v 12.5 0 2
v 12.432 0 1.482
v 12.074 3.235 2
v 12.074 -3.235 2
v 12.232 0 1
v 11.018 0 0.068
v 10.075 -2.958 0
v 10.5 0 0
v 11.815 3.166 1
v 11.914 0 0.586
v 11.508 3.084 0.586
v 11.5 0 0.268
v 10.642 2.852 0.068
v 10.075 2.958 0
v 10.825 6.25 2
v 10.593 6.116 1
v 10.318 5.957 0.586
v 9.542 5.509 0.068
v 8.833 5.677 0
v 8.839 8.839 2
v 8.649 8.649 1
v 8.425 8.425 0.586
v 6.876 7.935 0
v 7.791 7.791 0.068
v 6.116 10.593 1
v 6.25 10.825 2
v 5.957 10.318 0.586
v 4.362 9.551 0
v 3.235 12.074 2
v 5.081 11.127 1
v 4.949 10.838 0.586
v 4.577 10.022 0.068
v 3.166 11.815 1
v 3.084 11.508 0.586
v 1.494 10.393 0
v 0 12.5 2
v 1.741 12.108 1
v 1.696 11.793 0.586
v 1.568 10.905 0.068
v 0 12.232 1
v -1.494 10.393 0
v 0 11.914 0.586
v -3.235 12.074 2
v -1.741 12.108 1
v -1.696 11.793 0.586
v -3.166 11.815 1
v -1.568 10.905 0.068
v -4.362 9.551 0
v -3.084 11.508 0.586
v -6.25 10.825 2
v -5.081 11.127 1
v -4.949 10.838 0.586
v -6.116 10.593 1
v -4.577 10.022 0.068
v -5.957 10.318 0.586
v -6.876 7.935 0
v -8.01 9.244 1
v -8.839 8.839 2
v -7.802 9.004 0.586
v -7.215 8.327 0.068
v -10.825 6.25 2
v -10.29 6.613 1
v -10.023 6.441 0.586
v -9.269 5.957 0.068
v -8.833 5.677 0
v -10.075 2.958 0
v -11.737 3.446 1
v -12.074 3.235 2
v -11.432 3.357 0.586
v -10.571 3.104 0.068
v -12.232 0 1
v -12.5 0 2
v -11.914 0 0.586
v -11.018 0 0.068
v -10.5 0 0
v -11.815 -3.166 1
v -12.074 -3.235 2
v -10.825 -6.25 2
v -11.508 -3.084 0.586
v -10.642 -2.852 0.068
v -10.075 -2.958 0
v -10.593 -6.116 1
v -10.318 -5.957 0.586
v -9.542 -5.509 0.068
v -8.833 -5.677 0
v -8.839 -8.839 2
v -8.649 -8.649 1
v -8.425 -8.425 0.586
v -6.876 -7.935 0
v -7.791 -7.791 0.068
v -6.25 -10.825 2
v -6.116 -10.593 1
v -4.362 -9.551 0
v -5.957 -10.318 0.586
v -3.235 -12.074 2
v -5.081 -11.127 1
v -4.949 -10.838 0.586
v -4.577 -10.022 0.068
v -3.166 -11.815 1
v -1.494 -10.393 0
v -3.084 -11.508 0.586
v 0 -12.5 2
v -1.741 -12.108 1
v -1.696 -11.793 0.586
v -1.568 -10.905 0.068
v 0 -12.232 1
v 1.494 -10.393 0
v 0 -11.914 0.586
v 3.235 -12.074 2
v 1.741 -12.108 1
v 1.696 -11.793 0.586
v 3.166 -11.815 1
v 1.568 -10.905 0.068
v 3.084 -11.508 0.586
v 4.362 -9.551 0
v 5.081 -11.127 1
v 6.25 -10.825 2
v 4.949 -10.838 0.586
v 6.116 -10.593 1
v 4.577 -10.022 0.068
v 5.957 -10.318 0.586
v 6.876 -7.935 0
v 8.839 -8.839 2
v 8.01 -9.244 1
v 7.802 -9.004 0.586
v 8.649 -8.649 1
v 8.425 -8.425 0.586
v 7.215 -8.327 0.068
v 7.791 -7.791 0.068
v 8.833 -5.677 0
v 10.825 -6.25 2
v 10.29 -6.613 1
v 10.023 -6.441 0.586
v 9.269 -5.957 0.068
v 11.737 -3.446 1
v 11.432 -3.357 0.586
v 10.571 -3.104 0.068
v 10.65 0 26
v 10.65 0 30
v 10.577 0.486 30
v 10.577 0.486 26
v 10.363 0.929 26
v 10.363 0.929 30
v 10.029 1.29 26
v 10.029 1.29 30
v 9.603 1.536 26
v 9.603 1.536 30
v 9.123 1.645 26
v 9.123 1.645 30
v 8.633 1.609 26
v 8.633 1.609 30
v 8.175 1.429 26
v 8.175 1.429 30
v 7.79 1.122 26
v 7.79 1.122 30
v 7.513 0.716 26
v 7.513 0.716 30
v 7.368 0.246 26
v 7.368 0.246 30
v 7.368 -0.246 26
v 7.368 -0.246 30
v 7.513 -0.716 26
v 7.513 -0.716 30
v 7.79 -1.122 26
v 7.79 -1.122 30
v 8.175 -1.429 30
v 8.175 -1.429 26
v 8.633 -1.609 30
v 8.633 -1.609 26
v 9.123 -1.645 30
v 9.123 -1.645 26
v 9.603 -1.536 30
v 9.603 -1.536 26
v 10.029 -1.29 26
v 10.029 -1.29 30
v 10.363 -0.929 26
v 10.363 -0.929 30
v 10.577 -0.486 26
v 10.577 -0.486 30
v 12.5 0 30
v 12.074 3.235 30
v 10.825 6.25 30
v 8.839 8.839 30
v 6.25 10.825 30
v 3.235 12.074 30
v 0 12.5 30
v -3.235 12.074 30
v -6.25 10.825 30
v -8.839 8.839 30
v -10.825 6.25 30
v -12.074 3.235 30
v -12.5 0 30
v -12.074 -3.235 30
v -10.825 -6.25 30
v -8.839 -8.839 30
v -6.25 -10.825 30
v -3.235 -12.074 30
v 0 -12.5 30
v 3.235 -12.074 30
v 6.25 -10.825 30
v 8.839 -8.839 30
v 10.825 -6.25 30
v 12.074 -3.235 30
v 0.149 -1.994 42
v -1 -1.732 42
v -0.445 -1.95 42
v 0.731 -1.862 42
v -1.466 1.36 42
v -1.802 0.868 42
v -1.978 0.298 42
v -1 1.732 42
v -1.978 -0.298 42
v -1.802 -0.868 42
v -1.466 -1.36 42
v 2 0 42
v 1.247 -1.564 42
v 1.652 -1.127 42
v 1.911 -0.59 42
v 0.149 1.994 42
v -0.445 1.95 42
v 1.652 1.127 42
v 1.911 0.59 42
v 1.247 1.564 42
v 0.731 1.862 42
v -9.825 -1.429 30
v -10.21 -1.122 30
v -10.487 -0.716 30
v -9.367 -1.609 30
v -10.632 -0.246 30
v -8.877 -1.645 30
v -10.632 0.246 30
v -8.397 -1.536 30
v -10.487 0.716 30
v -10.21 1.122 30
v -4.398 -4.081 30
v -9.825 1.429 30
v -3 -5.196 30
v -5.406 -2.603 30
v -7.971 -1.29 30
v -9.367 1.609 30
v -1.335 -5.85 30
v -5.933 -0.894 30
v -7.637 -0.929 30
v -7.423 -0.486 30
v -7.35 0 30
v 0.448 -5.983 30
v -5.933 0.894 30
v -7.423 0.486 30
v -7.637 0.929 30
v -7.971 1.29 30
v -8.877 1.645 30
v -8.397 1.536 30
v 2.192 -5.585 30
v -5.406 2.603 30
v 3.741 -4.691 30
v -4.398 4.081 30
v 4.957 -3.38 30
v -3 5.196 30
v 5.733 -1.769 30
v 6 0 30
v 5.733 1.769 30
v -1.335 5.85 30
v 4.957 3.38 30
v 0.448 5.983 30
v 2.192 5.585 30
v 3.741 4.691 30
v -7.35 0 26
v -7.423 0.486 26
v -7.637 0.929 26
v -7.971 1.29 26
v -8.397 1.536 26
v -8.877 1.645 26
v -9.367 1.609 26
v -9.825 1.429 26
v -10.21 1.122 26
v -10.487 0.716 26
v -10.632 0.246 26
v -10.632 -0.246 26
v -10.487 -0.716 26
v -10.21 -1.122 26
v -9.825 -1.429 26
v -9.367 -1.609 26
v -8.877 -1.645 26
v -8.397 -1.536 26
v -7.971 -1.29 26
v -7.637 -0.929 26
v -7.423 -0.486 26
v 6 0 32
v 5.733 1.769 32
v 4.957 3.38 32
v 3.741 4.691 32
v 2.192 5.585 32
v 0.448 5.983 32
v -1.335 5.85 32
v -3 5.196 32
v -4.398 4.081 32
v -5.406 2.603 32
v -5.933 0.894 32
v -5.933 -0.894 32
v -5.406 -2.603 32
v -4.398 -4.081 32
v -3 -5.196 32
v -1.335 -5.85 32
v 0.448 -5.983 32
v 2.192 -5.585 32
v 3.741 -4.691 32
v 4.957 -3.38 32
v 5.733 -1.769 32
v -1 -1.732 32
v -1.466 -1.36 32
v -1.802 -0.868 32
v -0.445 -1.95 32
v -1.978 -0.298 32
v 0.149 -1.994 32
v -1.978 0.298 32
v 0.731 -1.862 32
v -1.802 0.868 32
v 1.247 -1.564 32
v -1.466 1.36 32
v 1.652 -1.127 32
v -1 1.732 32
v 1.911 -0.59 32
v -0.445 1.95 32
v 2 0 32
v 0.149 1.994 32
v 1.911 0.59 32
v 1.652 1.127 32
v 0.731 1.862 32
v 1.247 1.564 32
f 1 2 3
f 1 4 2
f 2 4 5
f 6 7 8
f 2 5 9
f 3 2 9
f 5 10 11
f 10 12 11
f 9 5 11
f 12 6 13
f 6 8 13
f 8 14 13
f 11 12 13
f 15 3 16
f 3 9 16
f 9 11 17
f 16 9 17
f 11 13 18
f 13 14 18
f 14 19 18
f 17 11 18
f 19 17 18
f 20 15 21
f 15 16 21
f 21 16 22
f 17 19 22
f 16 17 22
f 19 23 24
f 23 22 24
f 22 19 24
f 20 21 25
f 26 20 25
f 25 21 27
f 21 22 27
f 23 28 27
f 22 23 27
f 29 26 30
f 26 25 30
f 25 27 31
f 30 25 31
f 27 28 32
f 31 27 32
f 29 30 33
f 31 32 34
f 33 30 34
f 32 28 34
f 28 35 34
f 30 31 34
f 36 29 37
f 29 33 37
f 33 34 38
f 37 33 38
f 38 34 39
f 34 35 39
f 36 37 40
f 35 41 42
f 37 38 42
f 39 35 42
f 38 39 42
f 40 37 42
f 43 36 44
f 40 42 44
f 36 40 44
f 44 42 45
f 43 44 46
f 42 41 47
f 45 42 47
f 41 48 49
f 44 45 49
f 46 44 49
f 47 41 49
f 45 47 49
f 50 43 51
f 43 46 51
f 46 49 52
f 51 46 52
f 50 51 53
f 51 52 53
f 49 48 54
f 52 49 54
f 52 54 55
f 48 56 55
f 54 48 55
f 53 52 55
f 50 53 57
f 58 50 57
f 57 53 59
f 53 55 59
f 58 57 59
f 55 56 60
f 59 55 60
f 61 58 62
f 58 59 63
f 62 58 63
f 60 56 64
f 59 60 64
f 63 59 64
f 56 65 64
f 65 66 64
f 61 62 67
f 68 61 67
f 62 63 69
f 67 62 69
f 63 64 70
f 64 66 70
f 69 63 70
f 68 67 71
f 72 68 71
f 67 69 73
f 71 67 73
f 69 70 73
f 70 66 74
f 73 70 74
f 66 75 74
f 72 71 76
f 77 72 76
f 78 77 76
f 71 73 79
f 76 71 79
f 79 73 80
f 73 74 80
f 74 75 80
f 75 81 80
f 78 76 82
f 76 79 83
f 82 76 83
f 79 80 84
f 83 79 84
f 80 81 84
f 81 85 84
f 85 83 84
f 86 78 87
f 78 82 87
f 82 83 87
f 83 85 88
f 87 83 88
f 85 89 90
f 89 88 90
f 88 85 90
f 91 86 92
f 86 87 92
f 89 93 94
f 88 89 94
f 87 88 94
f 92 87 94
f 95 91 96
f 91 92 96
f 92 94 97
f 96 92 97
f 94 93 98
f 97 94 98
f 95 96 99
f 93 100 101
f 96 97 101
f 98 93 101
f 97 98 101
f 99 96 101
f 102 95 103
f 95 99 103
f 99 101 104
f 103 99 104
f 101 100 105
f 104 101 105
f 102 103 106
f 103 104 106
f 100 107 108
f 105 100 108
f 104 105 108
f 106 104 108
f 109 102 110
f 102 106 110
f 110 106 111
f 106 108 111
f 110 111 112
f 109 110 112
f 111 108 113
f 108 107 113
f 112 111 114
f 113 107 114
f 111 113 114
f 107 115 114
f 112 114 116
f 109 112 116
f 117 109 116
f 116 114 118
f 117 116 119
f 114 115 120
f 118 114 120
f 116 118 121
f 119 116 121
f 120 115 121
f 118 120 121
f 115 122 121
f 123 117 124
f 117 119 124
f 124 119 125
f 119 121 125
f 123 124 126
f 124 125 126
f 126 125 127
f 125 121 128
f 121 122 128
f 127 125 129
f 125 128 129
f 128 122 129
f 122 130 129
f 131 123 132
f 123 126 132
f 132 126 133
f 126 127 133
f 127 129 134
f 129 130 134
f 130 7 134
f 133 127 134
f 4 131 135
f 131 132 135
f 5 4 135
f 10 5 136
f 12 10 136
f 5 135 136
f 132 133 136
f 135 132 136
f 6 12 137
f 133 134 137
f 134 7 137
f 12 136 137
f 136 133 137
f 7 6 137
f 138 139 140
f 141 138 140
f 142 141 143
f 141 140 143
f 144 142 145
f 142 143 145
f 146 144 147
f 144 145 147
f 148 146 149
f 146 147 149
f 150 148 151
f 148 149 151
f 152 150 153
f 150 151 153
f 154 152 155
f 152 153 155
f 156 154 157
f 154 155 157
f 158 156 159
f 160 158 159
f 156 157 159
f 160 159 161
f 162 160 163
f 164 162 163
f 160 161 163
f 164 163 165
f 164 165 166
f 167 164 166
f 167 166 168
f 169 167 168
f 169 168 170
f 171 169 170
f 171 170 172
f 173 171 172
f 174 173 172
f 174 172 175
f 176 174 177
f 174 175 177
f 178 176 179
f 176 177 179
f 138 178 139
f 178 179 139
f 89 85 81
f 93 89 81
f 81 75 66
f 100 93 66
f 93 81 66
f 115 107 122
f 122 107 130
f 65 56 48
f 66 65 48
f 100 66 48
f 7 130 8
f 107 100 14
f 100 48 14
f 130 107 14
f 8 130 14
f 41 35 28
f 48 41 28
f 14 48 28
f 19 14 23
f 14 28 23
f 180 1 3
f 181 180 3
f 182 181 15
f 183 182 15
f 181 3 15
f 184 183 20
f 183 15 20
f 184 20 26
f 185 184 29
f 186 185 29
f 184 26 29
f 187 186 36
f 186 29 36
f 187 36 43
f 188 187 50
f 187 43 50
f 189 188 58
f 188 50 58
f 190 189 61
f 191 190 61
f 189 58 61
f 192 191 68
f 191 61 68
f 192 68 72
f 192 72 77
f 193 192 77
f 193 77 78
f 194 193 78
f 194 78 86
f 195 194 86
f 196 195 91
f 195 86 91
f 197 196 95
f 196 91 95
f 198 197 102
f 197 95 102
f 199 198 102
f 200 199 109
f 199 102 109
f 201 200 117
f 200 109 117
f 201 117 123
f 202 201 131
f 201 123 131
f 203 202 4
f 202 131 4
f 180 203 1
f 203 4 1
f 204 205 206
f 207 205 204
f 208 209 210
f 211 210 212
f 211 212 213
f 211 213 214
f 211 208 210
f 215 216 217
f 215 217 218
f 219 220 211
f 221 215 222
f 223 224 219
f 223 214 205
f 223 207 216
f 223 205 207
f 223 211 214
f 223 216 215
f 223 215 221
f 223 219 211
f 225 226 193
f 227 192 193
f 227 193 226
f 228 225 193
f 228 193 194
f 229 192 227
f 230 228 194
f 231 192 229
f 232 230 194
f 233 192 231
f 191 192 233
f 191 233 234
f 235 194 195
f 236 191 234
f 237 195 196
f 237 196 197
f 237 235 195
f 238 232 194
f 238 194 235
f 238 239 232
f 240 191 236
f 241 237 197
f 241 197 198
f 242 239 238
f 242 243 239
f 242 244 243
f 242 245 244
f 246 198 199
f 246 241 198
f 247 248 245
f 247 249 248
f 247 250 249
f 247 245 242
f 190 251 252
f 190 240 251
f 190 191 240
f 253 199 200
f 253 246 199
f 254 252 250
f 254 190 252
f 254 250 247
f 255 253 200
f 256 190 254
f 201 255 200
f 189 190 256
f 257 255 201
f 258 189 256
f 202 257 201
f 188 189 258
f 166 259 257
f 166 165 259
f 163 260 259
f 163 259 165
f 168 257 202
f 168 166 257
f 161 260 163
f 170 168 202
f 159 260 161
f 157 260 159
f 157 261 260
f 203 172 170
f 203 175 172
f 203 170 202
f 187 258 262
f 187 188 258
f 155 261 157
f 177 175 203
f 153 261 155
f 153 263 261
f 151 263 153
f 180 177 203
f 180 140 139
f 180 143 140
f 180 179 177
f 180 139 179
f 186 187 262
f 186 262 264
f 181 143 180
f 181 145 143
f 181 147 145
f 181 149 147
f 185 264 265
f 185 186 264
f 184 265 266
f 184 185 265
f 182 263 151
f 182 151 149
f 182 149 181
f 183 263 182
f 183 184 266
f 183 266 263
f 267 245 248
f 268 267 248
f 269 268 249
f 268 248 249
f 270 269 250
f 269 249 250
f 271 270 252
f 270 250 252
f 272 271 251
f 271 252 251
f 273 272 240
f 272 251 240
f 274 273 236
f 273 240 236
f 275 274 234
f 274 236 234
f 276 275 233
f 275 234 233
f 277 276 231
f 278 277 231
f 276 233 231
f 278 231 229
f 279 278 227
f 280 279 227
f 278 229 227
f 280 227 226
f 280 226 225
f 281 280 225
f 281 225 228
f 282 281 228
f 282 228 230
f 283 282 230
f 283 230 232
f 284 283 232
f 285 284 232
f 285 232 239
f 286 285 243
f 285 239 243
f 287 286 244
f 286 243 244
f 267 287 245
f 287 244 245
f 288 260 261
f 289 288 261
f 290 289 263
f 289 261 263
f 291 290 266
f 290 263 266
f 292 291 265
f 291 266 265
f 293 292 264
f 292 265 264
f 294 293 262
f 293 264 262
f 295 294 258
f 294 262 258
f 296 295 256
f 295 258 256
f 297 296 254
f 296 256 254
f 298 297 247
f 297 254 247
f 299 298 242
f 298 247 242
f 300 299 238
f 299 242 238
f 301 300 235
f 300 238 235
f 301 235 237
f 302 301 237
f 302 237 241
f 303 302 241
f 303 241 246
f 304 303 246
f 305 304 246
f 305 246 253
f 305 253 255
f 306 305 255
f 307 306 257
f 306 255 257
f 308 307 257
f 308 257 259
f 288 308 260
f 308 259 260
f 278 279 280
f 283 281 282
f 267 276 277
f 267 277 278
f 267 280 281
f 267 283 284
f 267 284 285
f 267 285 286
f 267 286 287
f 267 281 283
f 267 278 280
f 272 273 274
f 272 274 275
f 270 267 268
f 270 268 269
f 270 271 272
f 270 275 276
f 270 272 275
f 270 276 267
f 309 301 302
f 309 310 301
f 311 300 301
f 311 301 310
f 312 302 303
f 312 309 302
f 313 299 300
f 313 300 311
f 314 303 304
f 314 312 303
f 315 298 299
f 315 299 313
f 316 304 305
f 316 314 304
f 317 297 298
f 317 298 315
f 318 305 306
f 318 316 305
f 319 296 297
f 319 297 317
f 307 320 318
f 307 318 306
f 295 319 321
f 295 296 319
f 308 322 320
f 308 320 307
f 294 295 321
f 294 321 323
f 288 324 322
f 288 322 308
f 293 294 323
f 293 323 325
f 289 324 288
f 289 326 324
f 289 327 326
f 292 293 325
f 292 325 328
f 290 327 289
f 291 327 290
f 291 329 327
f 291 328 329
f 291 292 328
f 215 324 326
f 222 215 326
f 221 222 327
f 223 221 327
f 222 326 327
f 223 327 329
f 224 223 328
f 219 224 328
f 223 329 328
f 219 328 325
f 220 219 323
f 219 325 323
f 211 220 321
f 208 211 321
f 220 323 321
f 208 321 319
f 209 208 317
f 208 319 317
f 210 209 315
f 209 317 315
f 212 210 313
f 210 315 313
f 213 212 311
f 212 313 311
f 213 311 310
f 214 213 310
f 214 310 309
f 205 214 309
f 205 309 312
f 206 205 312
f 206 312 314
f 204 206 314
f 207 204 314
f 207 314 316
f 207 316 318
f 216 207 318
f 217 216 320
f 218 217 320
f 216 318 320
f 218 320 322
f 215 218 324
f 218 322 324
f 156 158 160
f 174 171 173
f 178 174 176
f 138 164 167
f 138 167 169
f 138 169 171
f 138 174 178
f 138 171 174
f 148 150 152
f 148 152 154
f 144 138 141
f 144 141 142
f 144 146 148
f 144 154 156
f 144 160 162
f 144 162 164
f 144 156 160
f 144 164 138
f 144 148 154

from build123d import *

# Parameters (mm, degrees)
SKETCH_1_R          = 12.5
EXTRUDE_1_DEPTH     = 30
SKETCH_3_R          = 1.65
CUT_EXTRUDE_1_DEPTH = 4
SKETCH_4_R          = 6
EXTRUDE_2_DEPTH     = 2
SKETCH_5_R          = 2
EXTRUDE_3_DEPTH     = 10
FILLET_1_R          = 2


with BuildPart() as part:
    # 草图1 → 凸台-拉伸1 (new body)
    with BuildSketch(Plane.XY):
        Circle(SKETCH_1_R)
    extrude(amount=EXTRUDE_1_DEPTH)

    # 草图3 → 切除-拉伸1 (cut)
    with BuildSketch(Plane.XY.offset(30)):
        with Locations((-9, 0)):
            Circle(SKETCH_3_R)
        with Locations((9, 0)):
            Circle(SKETCH_3_R)
    extrude(amount=-CUT_EXTRUDE_1_DEPTH, mode=Mode.SUBTRACT)

    # 草图4 → 凸台-拉伸2 (add)
    with BuildSketch(Plane.XY.offset(30)):
        Circle(SKETCH_4_R)
    extrude(amount=EXTRUDE_2_DEPTH)

    # 草图5 → 凸台-拉伸3 (add)
    with BuildSketch(Plane.XY.offset(32)):
        Circle(SKETCH_5_R)
    extrude(amount=EXTRUDE_3_DEPTH)

    # 圆角1
    fillet_1_edges = [part.edges().sort_by_distance(p)[0] for p in [
        (-12.5, 0, 0),
    ]]
    fillet(fillet_1_edges, radius=FILLET_1_R)


solid = part.part
